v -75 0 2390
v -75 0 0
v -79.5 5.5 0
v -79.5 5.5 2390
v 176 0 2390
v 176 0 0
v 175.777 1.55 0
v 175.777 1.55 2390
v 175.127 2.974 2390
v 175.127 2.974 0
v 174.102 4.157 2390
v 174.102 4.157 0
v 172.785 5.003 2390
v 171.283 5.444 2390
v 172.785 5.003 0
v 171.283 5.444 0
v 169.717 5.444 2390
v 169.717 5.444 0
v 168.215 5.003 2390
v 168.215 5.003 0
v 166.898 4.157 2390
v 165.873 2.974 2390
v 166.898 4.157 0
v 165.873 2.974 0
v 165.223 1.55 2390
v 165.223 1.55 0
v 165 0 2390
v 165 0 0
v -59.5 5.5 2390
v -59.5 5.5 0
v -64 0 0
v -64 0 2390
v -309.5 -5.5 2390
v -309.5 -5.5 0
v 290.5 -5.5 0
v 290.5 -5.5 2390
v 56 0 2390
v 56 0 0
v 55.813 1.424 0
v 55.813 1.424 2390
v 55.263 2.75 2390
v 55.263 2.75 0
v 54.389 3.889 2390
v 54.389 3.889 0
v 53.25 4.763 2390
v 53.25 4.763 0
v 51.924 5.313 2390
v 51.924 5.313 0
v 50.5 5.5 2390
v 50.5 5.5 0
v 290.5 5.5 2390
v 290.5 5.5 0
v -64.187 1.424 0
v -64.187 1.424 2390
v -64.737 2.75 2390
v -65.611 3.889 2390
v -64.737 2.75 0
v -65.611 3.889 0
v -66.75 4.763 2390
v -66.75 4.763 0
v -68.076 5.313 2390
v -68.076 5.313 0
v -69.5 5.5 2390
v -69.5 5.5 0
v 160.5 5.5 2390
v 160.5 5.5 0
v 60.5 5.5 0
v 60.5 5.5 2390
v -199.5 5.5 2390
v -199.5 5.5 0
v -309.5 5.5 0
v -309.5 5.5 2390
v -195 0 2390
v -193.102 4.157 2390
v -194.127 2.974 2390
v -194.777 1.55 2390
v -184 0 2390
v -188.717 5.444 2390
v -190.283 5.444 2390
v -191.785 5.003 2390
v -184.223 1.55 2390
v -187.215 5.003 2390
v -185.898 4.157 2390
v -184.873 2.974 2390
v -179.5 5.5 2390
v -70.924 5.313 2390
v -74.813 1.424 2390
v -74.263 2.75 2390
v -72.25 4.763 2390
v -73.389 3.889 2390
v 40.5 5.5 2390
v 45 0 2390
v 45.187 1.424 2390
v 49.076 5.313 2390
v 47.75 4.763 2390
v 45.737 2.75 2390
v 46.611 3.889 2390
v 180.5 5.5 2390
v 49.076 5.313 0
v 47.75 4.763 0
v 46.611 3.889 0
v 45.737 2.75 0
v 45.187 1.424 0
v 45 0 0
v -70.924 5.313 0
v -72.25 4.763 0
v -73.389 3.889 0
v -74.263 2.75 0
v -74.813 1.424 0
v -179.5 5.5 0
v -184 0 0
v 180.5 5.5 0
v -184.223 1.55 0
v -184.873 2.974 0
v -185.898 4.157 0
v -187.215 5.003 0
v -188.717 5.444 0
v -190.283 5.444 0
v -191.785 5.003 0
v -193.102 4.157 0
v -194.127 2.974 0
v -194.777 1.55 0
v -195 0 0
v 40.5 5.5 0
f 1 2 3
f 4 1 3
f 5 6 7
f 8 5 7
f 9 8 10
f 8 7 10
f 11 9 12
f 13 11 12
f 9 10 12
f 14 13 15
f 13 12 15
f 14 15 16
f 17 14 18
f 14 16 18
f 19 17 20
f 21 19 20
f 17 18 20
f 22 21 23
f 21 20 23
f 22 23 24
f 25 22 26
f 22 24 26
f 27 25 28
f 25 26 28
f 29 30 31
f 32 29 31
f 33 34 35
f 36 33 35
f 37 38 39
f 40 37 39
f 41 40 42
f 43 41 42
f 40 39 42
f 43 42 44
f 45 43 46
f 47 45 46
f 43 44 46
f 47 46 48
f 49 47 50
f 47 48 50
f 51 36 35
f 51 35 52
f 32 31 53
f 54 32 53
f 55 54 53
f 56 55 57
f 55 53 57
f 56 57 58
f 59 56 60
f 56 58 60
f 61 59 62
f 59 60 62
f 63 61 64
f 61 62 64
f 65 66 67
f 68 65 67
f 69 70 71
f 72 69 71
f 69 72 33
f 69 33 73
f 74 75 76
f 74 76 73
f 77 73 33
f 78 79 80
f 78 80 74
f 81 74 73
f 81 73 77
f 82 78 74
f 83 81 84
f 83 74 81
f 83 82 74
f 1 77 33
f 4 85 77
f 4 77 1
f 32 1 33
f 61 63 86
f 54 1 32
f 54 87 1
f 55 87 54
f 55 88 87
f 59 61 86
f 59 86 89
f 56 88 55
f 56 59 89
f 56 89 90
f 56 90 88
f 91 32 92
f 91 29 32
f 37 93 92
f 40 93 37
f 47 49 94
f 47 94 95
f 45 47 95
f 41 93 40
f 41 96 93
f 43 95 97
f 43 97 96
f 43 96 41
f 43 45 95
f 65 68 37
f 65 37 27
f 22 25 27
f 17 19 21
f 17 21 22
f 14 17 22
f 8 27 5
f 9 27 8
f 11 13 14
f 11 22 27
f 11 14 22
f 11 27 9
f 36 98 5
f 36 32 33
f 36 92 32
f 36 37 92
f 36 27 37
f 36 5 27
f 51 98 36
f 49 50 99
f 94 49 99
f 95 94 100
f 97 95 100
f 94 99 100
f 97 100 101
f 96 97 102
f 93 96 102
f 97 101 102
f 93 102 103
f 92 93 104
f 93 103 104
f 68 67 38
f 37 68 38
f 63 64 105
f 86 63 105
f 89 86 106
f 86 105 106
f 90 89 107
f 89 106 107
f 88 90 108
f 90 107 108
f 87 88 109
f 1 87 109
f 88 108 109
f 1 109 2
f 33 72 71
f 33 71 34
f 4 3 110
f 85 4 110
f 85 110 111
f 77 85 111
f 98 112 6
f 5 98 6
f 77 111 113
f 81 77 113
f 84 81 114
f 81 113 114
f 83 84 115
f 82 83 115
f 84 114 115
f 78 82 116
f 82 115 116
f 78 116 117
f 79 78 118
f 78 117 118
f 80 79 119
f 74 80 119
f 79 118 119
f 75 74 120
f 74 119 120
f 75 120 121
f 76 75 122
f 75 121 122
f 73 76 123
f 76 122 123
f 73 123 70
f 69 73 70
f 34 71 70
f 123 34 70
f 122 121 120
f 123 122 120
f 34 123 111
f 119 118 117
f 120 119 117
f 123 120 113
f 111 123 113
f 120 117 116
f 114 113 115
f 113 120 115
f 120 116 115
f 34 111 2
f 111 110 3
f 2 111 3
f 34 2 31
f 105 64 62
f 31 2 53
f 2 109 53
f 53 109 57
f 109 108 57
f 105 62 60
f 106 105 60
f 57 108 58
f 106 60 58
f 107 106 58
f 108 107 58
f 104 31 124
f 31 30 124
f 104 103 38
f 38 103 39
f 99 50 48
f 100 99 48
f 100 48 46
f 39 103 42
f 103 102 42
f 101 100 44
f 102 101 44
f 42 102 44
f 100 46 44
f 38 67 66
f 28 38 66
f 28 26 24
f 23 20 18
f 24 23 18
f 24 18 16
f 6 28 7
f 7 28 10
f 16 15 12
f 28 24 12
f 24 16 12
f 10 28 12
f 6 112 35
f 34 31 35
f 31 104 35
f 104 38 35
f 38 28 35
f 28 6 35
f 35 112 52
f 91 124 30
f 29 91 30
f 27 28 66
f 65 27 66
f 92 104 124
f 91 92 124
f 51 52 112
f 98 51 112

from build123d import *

# Parameters (mm, degrees)
F1_DEPTH = 2390


# Not quite as in the source:
# - a feature names something its author has since deleted; it is built from what else it names


with BuildPart() as f1:
    # F0 (on Top) → F1 (new body)
    with BuildSketch(Plane.XY):
        with BuildLine():
            Line((-309.5, -5.5), (290.5, -5.5))
            ThreePointArc((290.5, -5.5), (285, 0), (290.5, 5.5))
            Line((290.5, 5.5), (180.5, 5.5))
            Line((180.5, 5.5), (176, 0))
            ThreePointArc((176, 0), (170.5, 5.5), (165, 0))
            Line((165, 0), (160.5, 5.5))
            Line((160.5, 5.5), (60.5, 5.5))
            Line((60.5, 5.5), (56, 0))
            ThreePointArc((56, 0), (54.3890872965, 3.8890872965), (50.5, 5.5))
            ThreePointArc((50.5, 5.5), (46.6109127035, 3.8890872965), (45, 0))
            Line((45, 0), (40.5, 5.5))
            Line((40.5, 5.5), (-59.5, 5.5))
            Line((-59.5, 5.5), (-64, 0))
            ThreePointArc((-64, 0), (-65.6109127035, 3.8890872965), (-69.5, 5.5))
            ThreePointArc((-69.5, 5.5), (-73.3890872965, 3.8890872965), (-75, 0))
            Line((-75, 0), (-79.5, 5.5))
            Line((-79.5, 5.5), (-179.5, 5.5))
            Line((-179.5, 5.5), (-184, 0))
            ThreePointArc((-184, 0), (-189.5, 5.5), (-195, 0))
            Line((-195, 0), (-199.5, 5.5))
            Line((-199.5, 5.5), (-309.5, 5.5))
            Line((-309.5, 5.5), (-309.5, -5.5))
        make_face()
        with BuildLine():
            ThreePointArc((290.5, 5.5), (285, 0), (290.5, -5.5))
            Line((290.5, -5.5), (290.5, 5.5))
        make_face()
    extrude(amount=F1_DEPTH)


solid = f1.part
